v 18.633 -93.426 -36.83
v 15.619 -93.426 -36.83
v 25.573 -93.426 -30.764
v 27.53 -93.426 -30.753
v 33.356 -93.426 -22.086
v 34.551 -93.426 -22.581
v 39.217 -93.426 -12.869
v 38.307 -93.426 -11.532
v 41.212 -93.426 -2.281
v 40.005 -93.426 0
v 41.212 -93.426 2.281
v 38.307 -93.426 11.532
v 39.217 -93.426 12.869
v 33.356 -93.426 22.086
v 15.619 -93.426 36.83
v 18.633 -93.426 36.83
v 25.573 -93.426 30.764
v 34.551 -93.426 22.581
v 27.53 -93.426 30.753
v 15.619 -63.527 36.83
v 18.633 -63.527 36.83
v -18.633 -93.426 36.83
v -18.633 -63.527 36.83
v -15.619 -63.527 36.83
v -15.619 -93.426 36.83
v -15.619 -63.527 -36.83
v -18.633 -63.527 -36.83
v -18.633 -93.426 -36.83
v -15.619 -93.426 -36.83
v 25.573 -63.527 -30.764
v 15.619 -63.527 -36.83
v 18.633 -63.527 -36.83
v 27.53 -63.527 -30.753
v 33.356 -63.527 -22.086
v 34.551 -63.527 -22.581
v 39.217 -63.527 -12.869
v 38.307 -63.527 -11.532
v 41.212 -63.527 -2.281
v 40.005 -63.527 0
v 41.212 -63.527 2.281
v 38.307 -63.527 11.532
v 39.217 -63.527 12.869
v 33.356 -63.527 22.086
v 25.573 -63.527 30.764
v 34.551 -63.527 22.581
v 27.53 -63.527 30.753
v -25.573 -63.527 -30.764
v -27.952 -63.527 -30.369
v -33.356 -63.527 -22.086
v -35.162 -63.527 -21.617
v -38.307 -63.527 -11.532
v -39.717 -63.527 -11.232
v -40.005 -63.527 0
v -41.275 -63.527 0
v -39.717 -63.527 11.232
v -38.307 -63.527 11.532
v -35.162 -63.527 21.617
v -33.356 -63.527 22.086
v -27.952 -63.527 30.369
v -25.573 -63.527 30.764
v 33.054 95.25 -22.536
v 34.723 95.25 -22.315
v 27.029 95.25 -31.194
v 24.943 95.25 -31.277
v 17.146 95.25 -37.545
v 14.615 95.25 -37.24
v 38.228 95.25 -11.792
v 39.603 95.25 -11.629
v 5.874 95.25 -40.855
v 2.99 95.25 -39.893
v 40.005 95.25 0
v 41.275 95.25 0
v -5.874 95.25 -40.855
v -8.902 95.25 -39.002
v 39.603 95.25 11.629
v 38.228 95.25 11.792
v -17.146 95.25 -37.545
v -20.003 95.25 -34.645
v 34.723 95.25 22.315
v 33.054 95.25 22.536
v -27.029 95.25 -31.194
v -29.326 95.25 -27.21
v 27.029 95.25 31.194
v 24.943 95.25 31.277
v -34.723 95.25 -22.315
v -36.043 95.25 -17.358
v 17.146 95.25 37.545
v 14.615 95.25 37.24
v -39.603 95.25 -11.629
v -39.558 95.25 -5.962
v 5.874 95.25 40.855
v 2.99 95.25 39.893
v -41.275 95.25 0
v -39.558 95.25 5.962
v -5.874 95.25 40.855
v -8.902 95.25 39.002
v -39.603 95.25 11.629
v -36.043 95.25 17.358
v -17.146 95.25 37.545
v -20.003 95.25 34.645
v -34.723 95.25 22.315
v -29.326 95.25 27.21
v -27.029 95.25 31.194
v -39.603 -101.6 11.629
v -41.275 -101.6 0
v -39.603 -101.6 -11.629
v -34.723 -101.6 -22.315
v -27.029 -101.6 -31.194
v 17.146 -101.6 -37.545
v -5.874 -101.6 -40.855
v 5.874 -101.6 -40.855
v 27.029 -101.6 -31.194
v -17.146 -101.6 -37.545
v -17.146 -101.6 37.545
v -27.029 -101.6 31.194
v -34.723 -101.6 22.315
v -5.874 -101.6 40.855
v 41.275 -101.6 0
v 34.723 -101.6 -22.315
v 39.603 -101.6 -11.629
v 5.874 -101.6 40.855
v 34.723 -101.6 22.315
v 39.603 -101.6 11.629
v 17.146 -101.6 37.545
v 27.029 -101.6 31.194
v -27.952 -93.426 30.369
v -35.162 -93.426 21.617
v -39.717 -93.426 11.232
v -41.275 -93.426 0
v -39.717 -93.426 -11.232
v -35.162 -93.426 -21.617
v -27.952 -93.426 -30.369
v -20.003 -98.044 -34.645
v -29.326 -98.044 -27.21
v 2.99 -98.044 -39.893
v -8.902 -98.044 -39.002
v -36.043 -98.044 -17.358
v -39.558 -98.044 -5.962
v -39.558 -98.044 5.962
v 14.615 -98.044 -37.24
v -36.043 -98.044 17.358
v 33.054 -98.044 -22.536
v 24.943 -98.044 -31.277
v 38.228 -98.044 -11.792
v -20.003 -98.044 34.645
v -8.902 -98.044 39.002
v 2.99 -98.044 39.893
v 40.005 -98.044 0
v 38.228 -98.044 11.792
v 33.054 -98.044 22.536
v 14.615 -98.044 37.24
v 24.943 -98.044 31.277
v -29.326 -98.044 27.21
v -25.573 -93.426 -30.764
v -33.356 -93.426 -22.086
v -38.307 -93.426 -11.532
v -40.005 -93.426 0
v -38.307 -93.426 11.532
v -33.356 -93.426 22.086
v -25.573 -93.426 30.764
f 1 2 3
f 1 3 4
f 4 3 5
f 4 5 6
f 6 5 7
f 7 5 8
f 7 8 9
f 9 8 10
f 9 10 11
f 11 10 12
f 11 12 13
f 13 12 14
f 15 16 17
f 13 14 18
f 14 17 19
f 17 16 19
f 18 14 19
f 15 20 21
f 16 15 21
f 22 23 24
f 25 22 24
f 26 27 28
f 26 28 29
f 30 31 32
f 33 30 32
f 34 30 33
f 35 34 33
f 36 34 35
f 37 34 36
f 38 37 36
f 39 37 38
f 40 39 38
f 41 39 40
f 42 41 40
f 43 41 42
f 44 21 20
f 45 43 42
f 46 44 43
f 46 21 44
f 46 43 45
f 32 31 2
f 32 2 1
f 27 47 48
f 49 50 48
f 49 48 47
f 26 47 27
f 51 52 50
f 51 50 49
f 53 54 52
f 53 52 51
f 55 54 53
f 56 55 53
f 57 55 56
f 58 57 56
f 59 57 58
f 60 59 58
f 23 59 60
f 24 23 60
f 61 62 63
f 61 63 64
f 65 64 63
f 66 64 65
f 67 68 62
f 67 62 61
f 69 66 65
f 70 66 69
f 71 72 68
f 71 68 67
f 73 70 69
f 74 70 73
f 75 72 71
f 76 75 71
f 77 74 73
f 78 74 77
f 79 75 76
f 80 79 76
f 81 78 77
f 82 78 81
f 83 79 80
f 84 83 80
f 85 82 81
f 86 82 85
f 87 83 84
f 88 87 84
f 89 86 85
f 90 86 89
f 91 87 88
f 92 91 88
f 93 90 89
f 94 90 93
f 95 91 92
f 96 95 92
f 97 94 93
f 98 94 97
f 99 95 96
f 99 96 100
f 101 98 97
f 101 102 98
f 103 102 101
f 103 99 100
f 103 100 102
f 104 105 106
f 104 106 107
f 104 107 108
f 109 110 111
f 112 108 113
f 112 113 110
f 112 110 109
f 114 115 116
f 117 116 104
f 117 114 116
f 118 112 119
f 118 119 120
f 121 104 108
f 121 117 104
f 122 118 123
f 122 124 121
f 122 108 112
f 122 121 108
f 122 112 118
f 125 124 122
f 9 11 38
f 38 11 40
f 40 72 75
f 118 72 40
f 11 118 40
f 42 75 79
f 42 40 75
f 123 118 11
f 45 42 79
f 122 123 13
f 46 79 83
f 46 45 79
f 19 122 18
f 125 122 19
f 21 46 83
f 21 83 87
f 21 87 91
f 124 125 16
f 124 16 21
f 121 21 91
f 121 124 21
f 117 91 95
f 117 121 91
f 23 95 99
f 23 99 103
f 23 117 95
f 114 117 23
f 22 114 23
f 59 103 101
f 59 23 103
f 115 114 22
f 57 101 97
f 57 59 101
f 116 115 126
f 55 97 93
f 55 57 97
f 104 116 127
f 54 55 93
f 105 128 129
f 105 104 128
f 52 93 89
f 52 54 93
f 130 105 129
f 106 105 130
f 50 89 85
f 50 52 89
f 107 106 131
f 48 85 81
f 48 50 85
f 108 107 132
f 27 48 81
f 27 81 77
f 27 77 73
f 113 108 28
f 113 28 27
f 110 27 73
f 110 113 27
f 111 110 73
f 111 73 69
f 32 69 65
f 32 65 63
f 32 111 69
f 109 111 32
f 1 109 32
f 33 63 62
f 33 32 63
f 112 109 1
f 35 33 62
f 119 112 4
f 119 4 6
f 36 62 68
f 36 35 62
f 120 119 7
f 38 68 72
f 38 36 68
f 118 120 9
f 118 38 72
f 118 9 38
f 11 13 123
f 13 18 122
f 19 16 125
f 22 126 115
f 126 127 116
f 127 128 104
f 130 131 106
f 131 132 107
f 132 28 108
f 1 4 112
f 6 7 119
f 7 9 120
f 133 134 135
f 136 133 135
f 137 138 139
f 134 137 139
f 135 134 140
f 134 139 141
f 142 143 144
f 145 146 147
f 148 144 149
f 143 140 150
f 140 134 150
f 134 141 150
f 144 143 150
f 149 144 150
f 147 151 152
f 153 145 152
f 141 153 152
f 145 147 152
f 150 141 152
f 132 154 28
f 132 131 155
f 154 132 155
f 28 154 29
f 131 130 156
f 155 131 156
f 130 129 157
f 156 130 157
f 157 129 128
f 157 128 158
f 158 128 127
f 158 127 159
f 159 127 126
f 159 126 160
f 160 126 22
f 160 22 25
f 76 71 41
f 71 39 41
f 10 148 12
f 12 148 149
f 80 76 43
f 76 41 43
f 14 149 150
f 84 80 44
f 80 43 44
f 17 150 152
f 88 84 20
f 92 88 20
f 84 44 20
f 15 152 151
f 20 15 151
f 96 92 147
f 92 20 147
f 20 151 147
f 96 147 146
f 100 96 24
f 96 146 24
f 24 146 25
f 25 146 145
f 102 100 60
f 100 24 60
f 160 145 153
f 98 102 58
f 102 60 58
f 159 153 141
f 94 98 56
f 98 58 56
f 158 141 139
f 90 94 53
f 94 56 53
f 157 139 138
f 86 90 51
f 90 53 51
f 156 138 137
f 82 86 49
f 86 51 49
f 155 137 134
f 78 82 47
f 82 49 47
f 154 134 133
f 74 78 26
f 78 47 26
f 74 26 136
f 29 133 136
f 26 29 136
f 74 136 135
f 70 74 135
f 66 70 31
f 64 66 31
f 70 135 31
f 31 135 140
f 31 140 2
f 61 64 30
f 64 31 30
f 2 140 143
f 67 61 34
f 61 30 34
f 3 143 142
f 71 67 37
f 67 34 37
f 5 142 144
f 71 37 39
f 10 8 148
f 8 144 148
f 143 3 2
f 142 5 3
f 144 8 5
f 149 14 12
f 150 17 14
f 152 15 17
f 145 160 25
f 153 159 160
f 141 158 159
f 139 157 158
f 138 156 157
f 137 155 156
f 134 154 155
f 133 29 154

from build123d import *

# Parameters (mm, degrees)
F0_R     = 41.275
F1_DEPTH = 101.6
F2_W     = 82.747999
F2_H     = 29.89918
F3_DEPTH = 36.83
F4_R     = 40.005
F5_DEPTH = 98.044
F6_R     = 41.275
F7_DEPTH = 6.35


with BuildPart() as f1:
    # F0 (on Front) → F1 (new body, symmetric)
    with BuildSketch(Plane.XZ):
        Circle(F0_R)
    extrude(amount=F1_DEPTH, both=True)

    # F2 (on Top) → F3 (cut, symmetric)
    with BuildSketch(Plane.XY):
        with Locations((-0.162097, -78.476146)):
            Rectangle(F2_W, F2_H)
    extrude(amount=F3_DEPTH, both=True, mode=Mode.SUBTRACT)

    # F4 (on Front) → F5 (cut, symmetric)
    with BuildSketch(Plane.XZ):
        Circle(F4_R)
    extrude(amount=F5_DEPTH, both=True, mode=Mode.SUBTRACT)

    # F6 (on face) → F7 (cut, symmetric)
    with BuildSketch(Plane(origin=(0, 101.6, 0), x_dir=(-1, 0, 0), z_dir=(0, 1, 0))):
        Circle(F6_R)
    extrude(amount=F7_DEPTH, both=True, mode=Mode.SUBTRACT)


solid = f1.part
